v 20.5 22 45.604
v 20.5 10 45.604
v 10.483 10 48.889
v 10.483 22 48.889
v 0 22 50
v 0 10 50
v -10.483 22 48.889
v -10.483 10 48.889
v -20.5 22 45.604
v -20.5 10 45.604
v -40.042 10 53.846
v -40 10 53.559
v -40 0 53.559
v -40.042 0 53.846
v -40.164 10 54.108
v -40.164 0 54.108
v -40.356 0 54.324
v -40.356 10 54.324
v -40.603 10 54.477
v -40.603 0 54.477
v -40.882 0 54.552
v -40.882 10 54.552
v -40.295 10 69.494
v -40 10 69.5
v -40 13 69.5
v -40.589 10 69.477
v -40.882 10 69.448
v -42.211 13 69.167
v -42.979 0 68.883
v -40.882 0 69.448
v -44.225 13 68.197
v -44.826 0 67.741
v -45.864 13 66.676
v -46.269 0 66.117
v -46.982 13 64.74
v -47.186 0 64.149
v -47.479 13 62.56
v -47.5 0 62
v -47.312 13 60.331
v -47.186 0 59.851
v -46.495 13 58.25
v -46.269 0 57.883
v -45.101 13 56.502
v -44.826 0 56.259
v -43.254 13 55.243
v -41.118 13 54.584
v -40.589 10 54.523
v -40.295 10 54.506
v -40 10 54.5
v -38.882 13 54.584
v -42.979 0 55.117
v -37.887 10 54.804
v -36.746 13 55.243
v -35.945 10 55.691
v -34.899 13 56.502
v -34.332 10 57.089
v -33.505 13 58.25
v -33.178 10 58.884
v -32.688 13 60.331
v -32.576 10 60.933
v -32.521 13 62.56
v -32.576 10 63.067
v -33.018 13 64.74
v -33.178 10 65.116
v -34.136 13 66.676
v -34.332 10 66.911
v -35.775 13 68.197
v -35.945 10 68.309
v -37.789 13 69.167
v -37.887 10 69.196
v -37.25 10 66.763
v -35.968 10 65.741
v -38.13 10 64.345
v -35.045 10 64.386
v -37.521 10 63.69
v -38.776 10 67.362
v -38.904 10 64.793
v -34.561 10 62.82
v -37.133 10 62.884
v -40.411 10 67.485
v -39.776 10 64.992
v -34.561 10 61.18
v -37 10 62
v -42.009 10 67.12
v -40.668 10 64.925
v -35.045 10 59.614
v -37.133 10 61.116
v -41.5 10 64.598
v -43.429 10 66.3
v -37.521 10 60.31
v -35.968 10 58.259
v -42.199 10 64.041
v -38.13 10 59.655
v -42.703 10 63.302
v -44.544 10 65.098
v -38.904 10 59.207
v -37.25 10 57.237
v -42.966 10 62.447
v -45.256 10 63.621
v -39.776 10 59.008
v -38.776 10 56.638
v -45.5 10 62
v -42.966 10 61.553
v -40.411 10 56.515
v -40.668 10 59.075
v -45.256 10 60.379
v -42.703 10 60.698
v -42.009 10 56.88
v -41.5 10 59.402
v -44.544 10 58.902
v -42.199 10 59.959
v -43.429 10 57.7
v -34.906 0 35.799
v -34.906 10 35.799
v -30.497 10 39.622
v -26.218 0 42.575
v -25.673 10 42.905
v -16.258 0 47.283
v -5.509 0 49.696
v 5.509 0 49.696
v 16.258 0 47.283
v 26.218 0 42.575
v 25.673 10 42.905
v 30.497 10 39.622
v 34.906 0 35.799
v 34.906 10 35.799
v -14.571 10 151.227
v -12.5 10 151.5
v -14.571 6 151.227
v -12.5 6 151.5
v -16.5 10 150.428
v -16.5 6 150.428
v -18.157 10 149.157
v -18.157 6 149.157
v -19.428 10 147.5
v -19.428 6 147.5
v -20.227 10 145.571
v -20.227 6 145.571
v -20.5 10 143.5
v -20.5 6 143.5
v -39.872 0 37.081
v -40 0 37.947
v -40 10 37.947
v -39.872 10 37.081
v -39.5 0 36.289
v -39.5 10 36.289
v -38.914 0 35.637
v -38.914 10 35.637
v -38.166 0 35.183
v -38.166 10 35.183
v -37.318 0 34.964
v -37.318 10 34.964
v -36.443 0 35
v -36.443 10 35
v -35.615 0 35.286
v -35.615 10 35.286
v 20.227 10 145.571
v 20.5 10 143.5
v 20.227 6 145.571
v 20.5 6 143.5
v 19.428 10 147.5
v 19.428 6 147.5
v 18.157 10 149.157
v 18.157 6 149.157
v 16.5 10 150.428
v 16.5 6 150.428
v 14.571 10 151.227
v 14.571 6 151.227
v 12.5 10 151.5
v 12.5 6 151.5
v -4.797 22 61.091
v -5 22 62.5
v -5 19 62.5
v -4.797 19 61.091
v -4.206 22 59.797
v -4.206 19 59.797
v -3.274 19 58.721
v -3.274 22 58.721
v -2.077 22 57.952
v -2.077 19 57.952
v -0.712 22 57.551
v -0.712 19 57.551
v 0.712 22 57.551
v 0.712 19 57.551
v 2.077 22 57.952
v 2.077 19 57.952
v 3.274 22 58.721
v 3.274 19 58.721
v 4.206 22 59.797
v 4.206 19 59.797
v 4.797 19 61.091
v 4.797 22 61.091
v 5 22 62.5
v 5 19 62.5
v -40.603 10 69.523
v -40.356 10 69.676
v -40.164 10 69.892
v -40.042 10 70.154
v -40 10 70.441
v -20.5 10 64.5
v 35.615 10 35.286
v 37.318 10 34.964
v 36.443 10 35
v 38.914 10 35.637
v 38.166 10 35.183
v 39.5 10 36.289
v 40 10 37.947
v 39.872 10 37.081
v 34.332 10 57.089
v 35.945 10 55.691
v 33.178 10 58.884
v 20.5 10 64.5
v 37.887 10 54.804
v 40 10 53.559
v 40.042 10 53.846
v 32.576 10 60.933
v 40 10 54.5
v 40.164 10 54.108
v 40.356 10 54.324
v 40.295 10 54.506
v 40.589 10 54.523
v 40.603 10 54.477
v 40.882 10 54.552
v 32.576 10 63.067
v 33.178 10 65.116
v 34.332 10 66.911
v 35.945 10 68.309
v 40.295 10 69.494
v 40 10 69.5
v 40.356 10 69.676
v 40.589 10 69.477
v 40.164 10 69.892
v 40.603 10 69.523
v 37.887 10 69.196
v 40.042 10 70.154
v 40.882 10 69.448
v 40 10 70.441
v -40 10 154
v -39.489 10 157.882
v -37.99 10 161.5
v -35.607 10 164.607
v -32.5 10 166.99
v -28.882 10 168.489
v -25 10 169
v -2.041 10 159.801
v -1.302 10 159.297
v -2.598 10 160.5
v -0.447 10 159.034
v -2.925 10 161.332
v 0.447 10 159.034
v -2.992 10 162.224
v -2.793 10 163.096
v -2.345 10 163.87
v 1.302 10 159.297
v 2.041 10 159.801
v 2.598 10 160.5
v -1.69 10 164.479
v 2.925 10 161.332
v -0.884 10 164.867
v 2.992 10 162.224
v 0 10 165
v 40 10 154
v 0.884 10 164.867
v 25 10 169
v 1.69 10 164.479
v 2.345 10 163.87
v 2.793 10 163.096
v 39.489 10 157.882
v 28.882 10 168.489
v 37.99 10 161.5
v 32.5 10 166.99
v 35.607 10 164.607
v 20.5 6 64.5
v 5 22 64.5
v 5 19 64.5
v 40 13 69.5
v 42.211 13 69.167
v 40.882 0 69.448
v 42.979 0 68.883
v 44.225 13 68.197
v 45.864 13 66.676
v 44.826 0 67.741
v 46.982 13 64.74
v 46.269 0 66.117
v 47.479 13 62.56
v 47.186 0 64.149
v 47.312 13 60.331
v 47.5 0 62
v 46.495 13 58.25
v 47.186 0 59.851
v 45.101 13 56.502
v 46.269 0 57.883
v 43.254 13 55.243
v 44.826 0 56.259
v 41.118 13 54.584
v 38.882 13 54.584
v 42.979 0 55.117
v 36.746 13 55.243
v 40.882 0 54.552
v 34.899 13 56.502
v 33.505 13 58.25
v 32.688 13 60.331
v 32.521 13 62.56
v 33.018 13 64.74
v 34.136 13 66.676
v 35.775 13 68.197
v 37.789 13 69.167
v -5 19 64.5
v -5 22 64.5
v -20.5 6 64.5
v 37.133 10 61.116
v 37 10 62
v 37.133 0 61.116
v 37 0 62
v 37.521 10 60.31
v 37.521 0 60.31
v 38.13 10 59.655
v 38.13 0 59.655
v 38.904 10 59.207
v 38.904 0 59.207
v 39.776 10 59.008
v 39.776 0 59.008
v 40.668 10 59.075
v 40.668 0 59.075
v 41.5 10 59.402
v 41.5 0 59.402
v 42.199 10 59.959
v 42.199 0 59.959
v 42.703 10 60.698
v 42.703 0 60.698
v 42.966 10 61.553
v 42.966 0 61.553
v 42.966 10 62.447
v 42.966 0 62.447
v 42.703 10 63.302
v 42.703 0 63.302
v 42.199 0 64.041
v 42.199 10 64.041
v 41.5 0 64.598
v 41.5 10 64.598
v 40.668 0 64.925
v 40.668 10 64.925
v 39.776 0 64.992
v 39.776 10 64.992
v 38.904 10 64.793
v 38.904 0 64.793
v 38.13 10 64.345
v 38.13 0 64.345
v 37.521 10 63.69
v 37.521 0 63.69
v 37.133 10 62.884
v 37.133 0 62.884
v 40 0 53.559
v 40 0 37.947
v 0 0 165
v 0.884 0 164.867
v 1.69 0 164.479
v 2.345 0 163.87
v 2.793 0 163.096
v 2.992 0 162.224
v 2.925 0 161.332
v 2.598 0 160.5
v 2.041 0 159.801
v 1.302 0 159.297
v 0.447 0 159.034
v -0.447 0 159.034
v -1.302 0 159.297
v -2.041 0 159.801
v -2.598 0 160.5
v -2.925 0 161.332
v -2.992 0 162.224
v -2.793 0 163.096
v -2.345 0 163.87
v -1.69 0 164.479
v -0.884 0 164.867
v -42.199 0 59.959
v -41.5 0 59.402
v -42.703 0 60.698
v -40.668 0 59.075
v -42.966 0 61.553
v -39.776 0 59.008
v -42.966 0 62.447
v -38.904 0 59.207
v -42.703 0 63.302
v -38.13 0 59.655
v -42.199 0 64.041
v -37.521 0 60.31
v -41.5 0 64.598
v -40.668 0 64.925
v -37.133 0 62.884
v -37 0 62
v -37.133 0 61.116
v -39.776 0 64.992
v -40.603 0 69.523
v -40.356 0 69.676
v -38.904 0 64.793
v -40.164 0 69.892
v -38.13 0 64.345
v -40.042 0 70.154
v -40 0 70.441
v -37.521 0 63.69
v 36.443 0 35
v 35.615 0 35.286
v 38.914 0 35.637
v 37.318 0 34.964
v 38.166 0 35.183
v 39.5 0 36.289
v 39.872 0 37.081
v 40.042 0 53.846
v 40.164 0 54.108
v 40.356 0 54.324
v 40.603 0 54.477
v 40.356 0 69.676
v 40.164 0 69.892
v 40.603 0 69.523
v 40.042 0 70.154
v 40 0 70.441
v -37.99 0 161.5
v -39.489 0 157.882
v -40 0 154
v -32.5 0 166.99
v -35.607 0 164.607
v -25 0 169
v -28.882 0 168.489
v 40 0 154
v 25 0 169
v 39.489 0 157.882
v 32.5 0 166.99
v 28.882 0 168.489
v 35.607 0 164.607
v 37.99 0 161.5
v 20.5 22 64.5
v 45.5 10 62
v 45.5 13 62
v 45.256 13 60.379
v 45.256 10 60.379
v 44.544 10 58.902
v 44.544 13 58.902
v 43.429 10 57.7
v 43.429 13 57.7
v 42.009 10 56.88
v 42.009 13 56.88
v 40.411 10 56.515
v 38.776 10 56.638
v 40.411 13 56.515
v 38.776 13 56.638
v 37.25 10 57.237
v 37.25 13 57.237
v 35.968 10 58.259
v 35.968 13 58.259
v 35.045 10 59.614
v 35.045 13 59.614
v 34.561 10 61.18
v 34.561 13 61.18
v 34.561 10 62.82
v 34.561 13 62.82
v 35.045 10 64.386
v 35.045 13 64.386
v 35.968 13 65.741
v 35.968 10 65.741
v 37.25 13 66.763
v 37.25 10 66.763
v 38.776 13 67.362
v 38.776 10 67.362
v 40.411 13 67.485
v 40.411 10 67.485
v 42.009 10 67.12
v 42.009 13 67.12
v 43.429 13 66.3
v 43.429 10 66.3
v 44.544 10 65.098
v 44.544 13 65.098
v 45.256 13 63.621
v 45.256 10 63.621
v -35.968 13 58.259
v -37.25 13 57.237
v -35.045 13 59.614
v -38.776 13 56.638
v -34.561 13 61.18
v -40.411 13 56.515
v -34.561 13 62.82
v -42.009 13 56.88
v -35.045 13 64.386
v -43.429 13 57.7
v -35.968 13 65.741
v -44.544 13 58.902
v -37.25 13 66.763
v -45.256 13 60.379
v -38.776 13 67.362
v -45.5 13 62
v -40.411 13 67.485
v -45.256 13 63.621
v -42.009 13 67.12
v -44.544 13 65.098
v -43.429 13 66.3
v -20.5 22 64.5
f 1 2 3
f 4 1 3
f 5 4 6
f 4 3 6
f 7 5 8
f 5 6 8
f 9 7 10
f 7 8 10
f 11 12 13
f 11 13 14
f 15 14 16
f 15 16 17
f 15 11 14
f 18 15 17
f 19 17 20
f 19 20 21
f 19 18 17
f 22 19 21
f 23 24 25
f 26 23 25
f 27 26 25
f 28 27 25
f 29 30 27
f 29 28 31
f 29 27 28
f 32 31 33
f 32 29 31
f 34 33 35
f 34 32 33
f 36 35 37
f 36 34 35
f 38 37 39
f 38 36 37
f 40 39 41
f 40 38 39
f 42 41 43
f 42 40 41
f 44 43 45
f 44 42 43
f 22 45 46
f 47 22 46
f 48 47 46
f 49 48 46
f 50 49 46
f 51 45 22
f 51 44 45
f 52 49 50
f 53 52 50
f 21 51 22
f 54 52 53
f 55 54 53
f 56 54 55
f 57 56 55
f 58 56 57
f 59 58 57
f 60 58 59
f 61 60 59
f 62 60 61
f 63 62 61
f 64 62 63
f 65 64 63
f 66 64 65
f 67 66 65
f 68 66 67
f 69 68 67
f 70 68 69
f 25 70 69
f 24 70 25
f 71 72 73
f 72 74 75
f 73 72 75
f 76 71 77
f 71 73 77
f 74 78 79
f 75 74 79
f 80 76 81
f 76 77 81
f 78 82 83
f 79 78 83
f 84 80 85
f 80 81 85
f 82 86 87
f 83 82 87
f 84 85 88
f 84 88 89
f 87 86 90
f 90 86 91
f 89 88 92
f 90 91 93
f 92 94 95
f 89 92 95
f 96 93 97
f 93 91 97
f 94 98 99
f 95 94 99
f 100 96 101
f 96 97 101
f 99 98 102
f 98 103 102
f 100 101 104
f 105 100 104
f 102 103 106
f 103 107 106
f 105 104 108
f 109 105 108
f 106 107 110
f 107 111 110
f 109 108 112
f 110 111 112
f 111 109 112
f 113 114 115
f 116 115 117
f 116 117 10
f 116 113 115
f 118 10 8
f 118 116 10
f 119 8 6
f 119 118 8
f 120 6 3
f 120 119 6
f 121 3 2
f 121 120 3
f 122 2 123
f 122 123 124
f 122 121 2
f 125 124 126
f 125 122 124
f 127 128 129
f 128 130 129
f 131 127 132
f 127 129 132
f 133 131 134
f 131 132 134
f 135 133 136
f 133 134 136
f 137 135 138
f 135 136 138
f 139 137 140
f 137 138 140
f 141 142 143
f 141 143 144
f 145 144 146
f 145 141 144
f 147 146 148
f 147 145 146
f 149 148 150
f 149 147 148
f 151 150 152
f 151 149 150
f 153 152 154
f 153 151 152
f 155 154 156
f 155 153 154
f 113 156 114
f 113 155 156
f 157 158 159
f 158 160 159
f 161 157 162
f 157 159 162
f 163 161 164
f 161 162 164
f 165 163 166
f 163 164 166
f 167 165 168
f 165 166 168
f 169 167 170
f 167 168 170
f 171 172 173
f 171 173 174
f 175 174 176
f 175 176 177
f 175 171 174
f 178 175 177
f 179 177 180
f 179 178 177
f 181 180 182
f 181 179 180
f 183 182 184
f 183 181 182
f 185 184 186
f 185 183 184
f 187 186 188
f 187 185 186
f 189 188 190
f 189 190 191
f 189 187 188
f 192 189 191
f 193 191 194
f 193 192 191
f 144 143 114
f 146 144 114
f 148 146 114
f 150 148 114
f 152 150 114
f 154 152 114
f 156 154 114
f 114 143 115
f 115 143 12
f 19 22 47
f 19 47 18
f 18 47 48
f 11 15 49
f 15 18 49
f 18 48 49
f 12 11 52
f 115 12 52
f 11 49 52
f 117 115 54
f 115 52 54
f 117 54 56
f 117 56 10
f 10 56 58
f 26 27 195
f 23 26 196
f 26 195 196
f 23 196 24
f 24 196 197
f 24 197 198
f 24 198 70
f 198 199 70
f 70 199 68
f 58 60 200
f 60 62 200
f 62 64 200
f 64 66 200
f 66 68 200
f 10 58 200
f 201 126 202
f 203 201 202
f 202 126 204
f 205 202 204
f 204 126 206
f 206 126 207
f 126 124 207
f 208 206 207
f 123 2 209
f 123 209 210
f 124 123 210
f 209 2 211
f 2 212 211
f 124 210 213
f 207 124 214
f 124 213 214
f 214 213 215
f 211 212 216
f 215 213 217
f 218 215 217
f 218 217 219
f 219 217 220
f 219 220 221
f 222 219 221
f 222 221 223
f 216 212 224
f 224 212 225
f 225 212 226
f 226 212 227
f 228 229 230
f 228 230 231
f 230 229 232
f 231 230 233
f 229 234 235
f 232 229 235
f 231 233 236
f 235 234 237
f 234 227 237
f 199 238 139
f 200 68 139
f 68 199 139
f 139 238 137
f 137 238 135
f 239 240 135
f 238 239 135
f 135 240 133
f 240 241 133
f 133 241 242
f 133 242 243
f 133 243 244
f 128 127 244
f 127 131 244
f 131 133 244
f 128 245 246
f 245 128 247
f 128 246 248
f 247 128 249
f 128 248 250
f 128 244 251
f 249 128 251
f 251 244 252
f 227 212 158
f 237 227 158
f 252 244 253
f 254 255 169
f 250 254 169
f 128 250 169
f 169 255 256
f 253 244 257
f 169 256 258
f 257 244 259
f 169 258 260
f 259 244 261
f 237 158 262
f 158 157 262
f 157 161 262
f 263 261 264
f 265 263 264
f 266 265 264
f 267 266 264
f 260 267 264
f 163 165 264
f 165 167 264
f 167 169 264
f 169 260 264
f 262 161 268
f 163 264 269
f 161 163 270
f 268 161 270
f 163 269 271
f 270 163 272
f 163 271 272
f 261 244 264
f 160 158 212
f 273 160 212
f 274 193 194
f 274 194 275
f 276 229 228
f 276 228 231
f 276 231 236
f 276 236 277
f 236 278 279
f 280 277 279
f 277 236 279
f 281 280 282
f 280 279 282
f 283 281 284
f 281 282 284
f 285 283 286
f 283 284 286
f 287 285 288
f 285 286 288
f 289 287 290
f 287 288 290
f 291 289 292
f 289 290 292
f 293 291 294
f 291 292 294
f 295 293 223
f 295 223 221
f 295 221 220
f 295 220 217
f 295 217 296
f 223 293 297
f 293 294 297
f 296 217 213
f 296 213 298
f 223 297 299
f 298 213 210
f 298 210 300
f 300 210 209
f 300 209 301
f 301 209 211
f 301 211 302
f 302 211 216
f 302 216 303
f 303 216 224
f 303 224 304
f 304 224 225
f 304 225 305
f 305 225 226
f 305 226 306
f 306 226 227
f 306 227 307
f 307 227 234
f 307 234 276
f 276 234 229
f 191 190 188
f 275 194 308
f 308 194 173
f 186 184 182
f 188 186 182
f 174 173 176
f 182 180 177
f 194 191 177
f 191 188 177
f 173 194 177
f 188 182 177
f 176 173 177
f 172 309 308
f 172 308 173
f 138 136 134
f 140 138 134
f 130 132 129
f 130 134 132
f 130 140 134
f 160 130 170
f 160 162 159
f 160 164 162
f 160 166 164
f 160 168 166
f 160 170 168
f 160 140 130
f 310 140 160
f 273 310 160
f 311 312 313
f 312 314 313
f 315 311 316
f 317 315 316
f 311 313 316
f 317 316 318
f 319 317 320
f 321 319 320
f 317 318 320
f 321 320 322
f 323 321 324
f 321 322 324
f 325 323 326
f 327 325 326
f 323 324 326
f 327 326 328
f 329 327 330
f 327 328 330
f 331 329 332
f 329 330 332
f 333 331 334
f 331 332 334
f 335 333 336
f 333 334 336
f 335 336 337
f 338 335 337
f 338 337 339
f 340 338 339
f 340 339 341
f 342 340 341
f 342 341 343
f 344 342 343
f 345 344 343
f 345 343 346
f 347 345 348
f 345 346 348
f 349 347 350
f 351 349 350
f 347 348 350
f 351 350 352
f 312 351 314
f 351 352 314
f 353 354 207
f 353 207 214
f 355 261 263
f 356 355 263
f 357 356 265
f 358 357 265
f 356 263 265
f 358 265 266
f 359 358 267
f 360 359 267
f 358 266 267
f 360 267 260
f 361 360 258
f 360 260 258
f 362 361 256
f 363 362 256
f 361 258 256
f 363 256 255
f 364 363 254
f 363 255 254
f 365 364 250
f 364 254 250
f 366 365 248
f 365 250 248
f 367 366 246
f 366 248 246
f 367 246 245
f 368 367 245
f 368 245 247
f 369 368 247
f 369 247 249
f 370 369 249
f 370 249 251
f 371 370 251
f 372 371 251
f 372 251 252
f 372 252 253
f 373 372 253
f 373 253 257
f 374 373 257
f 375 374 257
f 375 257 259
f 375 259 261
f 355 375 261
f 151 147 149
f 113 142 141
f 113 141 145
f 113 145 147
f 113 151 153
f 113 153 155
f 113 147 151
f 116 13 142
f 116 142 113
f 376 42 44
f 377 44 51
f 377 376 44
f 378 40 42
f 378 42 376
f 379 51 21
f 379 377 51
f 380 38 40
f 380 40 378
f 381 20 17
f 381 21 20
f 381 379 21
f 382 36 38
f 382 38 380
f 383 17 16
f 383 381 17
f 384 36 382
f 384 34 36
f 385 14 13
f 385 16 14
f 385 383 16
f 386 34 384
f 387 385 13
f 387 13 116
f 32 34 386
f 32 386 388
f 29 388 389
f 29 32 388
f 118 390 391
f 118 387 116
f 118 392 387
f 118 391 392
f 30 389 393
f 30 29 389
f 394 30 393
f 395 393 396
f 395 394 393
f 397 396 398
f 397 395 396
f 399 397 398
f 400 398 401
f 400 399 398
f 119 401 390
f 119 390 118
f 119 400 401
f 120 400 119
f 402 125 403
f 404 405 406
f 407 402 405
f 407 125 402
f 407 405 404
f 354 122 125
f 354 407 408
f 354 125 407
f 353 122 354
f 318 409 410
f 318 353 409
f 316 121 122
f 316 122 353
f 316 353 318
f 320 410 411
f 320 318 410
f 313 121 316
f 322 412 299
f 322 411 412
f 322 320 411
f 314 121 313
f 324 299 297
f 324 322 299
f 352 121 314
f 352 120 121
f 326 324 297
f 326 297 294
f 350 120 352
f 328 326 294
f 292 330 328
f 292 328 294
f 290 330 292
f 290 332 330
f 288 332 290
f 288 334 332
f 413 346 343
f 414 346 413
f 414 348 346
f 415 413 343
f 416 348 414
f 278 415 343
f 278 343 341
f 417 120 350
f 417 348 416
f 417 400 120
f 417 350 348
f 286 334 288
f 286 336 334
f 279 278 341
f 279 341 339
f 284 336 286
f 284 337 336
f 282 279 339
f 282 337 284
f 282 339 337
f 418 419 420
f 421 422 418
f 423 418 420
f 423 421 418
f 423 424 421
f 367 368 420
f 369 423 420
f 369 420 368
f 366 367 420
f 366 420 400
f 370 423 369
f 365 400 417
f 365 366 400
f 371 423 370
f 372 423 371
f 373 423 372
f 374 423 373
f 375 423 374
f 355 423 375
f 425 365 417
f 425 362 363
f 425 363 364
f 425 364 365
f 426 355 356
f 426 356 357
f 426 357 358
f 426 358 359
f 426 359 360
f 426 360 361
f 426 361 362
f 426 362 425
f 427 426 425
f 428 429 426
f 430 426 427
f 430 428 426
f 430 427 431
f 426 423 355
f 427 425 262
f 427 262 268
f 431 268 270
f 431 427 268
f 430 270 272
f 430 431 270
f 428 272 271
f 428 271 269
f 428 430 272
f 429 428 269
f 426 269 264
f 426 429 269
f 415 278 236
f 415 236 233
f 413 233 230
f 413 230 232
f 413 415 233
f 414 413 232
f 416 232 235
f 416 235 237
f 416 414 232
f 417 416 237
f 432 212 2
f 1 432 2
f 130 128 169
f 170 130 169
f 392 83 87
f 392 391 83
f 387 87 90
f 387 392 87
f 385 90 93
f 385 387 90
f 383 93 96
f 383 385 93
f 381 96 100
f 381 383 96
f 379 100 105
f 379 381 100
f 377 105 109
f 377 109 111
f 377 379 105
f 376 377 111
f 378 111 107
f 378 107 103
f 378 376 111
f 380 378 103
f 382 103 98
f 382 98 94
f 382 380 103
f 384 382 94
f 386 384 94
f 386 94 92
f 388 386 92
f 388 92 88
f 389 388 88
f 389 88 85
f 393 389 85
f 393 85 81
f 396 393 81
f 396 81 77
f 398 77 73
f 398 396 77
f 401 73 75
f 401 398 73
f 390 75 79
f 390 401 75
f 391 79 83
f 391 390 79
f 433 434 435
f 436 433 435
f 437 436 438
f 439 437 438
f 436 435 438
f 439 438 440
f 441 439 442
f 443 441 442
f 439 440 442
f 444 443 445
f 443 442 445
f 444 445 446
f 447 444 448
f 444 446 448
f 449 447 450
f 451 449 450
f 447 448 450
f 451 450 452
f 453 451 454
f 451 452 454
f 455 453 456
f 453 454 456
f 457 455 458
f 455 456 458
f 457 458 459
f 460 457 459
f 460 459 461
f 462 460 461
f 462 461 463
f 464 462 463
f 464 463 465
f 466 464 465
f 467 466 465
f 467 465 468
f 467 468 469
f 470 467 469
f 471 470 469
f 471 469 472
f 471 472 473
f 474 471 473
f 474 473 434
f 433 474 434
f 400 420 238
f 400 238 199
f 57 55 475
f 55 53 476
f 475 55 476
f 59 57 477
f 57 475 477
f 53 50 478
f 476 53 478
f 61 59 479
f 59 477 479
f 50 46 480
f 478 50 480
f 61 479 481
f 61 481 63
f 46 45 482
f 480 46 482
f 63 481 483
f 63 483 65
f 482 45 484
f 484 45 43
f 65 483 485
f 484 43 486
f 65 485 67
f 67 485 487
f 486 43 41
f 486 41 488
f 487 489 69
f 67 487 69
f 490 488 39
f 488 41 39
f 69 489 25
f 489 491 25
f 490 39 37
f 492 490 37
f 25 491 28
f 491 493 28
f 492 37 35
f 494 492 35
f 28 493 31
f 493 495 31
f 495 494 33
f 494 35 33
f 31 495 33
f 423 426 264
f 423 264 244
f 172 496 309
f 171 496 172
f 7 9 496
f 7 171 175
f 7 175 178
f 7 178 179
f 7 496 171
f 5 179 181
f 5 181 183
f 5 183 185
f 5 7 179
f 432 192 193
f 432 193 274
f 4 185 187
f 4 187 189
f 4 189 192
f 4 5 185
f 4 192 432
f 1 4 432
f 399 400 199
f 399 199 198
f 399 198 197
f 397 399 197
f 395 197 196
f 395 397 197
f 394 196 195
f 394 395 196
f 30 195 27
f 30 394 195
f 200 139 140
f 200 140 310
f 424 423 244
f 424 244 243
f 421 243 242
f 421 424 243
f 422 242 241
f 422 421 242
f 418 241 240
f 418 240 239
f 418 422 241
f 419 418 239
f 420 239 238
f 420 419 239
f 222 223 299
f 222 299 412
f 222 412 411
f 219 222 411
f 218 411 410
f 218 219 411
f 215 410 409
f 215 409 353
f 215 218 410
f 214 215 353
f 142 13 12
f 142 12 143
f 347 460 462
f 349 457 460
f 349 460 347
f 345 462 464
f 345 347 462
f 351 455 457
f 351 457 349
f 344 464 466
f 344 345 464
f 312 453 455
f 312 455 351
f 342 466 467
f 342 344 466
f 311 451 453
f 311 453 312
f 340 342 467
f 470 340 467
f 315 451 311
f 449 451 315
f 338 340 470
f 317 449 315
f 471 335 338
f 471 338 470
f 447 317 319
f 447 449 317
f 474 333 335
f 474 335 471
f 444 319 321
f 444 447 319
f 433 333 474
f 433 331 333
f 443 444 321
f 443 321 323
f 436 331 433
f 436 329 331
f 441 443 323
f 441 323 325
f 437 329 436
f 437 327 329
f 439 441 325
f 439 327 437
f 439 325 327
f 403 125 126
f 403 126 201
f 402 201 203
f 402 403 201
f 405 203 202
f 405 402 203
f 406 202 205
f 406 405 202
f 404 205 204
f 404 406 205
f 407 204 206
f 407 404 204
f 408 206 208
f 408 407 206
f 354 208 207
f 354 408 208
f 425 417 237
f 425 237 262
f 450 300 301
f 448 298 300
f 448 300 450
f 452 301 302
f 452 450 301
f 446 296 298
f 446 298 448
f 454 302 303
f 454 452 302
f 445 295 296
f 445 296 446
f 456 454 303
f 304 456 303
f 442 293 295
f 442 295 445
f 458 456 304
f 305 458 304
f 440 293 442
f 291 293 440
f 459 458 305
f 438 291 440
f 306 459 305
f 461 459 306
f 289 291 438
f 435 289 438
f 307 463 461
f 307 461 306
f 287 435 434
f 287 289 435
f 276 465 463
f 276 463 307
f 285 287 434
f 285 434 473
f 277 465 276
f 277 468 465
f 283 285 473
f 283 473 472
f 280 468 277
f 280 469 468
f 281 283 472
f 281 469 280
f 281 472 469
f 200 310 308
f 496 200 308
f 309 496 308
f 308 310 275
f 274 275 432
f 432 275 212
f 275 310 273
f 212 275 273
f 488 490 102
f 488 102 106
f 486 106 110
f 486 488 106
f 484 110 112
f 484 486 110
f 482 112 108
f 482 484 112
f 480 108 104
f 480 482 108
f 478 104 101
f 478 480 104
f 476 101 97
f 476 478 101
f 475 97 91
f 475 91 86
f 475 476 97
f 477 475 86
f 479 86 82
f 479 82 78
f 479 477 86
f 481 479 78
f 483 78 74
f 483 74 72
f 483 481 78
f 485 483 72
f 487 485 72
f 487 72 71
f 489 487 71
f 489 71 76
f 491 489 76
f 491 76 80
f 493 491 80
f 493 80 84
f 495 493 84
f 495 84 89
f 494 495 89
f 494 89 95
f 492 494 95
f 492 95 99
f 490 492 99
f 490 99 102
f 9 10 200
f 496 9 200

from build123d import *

# Parameters (mm, degrees)
BOSS_EXTRUDE1_DEPTH                     = 10
SKETCH2_R                               = 7.5
BOSS_EXTRUDE2_DEPTH                     = 13
BOSS_EXTRUDE3_DEPTH                     = 12
SKETCH4_W                               = 41
SKETCH4_H                               = 87
CUT_EXTRUDE1_DEPTH                      = 4
CUT_EXTRUDE2_DEPTH                      = 3
CBORE_FOR_M5_HEX_HEAD_BOLT1_D           = 6
CBORE_FOR_M5_HEX_HEAD_BOLT1_CBORE_D     = 11
CBORE_FOR_M5_HEX_HEAD_BOLT1_CBORE_DEPTH = 3
SKETCH8_R                               = 3
CUT_EXTRUDE3_DEPTH                      = 176.958091601
FILLET1_R                               = 8
FILLET2_R                               = 1


with BuildPart() as part:
    # Sketch1 → Boss-Extrude1 (new body)
    with BuildSketch(Plane(origin=(0, 0, 0), x_dir=(1, 0, 0), z_dir=(0, 1, 0))):
        with BuildLine():
            Line((25, -169), (-25, -169))
            ThreePointArc((-25, -169), (-35.606601718, -164.606601718), (-40, -154))
            Line((-40, -154), (-40, -37.947331922))
            ThreePointArc((-40, -37.947331922), (-38.165543035, -35.183003896), (-34.905660377, -35.799369738))
            ThreePointArc((-34.905660377, -35.799369738), (0, -50), (34.905660377, -35.799369738))
            ThreePointArc((34.905660377, -35.799369738), (38.165543035, -35.183003896), (40, -37.947331922))
            Line((40, -37.947331922), (40, -154))
            ThreePointArc((40, -154), (35.606601718, -164.606601718), (25, -169))
        make_face()
    extrude(amount=BOSS_EXTRUDE1_DEPTH)

    # Sketch2 → Boss-Extrude2 (add)
    with BuildSketch(Plane(origin=(0, 0, 0), x_dir=(1, 0, 0), z_dir=(0, 1, 0))):
        with Locations((40, -62)):
            Circle(SKETCH2_R)
    boss_extrude2 = extrude(amount=BOSS_EXTRUDE2_DEPTH)

    # Sketch3 → Boss-Extrude3 (add)
    with BuildSketch(Plane(origin=(0, 10, 0), x_dir=(1, 0, 0), z_dir=(0, 1, 0))):
        with BuildLine():
            Line((-20.5, -45.604276115), (-20.5, -64.5))
            Line((-20.5, -64.5), (20.5, -64.5))
            Line((20.5, -64.5), (20.5, -45.604276115))
            ThreePointArc((20.5, -45.604276115), (0, -50), (-20.5, -45.604276115))
        make_face()
    extrude(amount=BOSS_EXTRUDE3_DEPTH)

    # Sketch4 → Cut-Extrude1 (cut)
    with BuildSketch(Plane(origin=(0, 10, 0), x_dir=(1, 0, 0), z_dir=(0, 1, 0))):
        with Locations((0, -108)):
            Rectangle(SKETCH4_W, SKETCH4_H)
    extrude(amount=-CUT_EXTRUDE1_DEPTH, mode=Mode.SUBTRACT)

    # Sketch5 → Cut-Extrude2 (cut)
    with BuildSketch(Plane(origin=(0, 22, 0), x_dir=(1, 0, 0), z_dir=(0, 1, 0))):
        with BuildLine():
            Line((-5, -64.5), (-5, -62.5))
            ThreePointArc((-5, -62.5), (0, -57.5), (5, -62.5))
            Line((5, -62.5), (5, -64.5))
            Line((5, -64.5), (-5, -64.5))
        make_face()
    extrude(amount=-CUT_EXTRUDE2_DEPTH, mode=Mode.SUBTRACT)

    # CBORE for M5 Hex Head Bolt1 (through all)
    with Locations(Plane(origin=(0, 13, 0), x_dir=(1, 0, 0), z_dir=(0, 1, 0))):
        with Locations((40, -62)):
            cbore_for_m5_hex_head_bolt1 = CounterBoreHole(CBORE_FOR_M5_HEX_HEAD_BOLT1_D / 2, CBORE_FOR_M5_HEX_HEAD_BOLT1_CBORE_D / 2, CBORE_FOR_M5_HEX_HEAD_BOLT1_CBORE_DEPTH)

    # Mirror3: Boss-Extrude2, CBORE for M5 Hex Head Bolt1 across plane
    add(boss_extrude2.mirror(Plane(origin=(0, 0, 0), x_dir=(0, 0, 1), z_dir=(1, 0, 0))))
    add(cbore_for_m5_hex_head_bolt1.mirror(Plane(origin=(0, 0, 0), x_dir=(0, 0, 1), z_dir=(1, 0, 0))), mode=Mode.SUBTRACT)

    # Sketch8 → Cut-Extrude3 (cut, through all)
    with BuildSketch(Plane(origin=(0, 10, 0), x_dir=(1, 0, 0), z_dir=(0, 1, 0))):
        with Locations((0, -162)):
            Circle(SKETCH8_R)
    extrude(amount=-CUT_EXTRUDE3_DEPTH, mode=Mode.SUBTRACT)

    # Fillet1
    fillet1_edges = [part.edges().sort_by_distance(p)[0] for p in [
        (20.5, 8, 151.5),
        (-20.5, 8, 151.5),
    ]]
    fillet(fillet1_edges, radius=FILLET1_R)

    # Fillet2
    fillet2_edges = [part.edges().sort_by_distance(p)[0] for p in [
        (-40, 5, 69.5),
        (-40, 5, 54.5),
        (40, 5, 54.5),
        (40, 5, 69.5),
    ]]
    fillet(fillet2_edges, radius=FILLET2_R)


solid = part.part
